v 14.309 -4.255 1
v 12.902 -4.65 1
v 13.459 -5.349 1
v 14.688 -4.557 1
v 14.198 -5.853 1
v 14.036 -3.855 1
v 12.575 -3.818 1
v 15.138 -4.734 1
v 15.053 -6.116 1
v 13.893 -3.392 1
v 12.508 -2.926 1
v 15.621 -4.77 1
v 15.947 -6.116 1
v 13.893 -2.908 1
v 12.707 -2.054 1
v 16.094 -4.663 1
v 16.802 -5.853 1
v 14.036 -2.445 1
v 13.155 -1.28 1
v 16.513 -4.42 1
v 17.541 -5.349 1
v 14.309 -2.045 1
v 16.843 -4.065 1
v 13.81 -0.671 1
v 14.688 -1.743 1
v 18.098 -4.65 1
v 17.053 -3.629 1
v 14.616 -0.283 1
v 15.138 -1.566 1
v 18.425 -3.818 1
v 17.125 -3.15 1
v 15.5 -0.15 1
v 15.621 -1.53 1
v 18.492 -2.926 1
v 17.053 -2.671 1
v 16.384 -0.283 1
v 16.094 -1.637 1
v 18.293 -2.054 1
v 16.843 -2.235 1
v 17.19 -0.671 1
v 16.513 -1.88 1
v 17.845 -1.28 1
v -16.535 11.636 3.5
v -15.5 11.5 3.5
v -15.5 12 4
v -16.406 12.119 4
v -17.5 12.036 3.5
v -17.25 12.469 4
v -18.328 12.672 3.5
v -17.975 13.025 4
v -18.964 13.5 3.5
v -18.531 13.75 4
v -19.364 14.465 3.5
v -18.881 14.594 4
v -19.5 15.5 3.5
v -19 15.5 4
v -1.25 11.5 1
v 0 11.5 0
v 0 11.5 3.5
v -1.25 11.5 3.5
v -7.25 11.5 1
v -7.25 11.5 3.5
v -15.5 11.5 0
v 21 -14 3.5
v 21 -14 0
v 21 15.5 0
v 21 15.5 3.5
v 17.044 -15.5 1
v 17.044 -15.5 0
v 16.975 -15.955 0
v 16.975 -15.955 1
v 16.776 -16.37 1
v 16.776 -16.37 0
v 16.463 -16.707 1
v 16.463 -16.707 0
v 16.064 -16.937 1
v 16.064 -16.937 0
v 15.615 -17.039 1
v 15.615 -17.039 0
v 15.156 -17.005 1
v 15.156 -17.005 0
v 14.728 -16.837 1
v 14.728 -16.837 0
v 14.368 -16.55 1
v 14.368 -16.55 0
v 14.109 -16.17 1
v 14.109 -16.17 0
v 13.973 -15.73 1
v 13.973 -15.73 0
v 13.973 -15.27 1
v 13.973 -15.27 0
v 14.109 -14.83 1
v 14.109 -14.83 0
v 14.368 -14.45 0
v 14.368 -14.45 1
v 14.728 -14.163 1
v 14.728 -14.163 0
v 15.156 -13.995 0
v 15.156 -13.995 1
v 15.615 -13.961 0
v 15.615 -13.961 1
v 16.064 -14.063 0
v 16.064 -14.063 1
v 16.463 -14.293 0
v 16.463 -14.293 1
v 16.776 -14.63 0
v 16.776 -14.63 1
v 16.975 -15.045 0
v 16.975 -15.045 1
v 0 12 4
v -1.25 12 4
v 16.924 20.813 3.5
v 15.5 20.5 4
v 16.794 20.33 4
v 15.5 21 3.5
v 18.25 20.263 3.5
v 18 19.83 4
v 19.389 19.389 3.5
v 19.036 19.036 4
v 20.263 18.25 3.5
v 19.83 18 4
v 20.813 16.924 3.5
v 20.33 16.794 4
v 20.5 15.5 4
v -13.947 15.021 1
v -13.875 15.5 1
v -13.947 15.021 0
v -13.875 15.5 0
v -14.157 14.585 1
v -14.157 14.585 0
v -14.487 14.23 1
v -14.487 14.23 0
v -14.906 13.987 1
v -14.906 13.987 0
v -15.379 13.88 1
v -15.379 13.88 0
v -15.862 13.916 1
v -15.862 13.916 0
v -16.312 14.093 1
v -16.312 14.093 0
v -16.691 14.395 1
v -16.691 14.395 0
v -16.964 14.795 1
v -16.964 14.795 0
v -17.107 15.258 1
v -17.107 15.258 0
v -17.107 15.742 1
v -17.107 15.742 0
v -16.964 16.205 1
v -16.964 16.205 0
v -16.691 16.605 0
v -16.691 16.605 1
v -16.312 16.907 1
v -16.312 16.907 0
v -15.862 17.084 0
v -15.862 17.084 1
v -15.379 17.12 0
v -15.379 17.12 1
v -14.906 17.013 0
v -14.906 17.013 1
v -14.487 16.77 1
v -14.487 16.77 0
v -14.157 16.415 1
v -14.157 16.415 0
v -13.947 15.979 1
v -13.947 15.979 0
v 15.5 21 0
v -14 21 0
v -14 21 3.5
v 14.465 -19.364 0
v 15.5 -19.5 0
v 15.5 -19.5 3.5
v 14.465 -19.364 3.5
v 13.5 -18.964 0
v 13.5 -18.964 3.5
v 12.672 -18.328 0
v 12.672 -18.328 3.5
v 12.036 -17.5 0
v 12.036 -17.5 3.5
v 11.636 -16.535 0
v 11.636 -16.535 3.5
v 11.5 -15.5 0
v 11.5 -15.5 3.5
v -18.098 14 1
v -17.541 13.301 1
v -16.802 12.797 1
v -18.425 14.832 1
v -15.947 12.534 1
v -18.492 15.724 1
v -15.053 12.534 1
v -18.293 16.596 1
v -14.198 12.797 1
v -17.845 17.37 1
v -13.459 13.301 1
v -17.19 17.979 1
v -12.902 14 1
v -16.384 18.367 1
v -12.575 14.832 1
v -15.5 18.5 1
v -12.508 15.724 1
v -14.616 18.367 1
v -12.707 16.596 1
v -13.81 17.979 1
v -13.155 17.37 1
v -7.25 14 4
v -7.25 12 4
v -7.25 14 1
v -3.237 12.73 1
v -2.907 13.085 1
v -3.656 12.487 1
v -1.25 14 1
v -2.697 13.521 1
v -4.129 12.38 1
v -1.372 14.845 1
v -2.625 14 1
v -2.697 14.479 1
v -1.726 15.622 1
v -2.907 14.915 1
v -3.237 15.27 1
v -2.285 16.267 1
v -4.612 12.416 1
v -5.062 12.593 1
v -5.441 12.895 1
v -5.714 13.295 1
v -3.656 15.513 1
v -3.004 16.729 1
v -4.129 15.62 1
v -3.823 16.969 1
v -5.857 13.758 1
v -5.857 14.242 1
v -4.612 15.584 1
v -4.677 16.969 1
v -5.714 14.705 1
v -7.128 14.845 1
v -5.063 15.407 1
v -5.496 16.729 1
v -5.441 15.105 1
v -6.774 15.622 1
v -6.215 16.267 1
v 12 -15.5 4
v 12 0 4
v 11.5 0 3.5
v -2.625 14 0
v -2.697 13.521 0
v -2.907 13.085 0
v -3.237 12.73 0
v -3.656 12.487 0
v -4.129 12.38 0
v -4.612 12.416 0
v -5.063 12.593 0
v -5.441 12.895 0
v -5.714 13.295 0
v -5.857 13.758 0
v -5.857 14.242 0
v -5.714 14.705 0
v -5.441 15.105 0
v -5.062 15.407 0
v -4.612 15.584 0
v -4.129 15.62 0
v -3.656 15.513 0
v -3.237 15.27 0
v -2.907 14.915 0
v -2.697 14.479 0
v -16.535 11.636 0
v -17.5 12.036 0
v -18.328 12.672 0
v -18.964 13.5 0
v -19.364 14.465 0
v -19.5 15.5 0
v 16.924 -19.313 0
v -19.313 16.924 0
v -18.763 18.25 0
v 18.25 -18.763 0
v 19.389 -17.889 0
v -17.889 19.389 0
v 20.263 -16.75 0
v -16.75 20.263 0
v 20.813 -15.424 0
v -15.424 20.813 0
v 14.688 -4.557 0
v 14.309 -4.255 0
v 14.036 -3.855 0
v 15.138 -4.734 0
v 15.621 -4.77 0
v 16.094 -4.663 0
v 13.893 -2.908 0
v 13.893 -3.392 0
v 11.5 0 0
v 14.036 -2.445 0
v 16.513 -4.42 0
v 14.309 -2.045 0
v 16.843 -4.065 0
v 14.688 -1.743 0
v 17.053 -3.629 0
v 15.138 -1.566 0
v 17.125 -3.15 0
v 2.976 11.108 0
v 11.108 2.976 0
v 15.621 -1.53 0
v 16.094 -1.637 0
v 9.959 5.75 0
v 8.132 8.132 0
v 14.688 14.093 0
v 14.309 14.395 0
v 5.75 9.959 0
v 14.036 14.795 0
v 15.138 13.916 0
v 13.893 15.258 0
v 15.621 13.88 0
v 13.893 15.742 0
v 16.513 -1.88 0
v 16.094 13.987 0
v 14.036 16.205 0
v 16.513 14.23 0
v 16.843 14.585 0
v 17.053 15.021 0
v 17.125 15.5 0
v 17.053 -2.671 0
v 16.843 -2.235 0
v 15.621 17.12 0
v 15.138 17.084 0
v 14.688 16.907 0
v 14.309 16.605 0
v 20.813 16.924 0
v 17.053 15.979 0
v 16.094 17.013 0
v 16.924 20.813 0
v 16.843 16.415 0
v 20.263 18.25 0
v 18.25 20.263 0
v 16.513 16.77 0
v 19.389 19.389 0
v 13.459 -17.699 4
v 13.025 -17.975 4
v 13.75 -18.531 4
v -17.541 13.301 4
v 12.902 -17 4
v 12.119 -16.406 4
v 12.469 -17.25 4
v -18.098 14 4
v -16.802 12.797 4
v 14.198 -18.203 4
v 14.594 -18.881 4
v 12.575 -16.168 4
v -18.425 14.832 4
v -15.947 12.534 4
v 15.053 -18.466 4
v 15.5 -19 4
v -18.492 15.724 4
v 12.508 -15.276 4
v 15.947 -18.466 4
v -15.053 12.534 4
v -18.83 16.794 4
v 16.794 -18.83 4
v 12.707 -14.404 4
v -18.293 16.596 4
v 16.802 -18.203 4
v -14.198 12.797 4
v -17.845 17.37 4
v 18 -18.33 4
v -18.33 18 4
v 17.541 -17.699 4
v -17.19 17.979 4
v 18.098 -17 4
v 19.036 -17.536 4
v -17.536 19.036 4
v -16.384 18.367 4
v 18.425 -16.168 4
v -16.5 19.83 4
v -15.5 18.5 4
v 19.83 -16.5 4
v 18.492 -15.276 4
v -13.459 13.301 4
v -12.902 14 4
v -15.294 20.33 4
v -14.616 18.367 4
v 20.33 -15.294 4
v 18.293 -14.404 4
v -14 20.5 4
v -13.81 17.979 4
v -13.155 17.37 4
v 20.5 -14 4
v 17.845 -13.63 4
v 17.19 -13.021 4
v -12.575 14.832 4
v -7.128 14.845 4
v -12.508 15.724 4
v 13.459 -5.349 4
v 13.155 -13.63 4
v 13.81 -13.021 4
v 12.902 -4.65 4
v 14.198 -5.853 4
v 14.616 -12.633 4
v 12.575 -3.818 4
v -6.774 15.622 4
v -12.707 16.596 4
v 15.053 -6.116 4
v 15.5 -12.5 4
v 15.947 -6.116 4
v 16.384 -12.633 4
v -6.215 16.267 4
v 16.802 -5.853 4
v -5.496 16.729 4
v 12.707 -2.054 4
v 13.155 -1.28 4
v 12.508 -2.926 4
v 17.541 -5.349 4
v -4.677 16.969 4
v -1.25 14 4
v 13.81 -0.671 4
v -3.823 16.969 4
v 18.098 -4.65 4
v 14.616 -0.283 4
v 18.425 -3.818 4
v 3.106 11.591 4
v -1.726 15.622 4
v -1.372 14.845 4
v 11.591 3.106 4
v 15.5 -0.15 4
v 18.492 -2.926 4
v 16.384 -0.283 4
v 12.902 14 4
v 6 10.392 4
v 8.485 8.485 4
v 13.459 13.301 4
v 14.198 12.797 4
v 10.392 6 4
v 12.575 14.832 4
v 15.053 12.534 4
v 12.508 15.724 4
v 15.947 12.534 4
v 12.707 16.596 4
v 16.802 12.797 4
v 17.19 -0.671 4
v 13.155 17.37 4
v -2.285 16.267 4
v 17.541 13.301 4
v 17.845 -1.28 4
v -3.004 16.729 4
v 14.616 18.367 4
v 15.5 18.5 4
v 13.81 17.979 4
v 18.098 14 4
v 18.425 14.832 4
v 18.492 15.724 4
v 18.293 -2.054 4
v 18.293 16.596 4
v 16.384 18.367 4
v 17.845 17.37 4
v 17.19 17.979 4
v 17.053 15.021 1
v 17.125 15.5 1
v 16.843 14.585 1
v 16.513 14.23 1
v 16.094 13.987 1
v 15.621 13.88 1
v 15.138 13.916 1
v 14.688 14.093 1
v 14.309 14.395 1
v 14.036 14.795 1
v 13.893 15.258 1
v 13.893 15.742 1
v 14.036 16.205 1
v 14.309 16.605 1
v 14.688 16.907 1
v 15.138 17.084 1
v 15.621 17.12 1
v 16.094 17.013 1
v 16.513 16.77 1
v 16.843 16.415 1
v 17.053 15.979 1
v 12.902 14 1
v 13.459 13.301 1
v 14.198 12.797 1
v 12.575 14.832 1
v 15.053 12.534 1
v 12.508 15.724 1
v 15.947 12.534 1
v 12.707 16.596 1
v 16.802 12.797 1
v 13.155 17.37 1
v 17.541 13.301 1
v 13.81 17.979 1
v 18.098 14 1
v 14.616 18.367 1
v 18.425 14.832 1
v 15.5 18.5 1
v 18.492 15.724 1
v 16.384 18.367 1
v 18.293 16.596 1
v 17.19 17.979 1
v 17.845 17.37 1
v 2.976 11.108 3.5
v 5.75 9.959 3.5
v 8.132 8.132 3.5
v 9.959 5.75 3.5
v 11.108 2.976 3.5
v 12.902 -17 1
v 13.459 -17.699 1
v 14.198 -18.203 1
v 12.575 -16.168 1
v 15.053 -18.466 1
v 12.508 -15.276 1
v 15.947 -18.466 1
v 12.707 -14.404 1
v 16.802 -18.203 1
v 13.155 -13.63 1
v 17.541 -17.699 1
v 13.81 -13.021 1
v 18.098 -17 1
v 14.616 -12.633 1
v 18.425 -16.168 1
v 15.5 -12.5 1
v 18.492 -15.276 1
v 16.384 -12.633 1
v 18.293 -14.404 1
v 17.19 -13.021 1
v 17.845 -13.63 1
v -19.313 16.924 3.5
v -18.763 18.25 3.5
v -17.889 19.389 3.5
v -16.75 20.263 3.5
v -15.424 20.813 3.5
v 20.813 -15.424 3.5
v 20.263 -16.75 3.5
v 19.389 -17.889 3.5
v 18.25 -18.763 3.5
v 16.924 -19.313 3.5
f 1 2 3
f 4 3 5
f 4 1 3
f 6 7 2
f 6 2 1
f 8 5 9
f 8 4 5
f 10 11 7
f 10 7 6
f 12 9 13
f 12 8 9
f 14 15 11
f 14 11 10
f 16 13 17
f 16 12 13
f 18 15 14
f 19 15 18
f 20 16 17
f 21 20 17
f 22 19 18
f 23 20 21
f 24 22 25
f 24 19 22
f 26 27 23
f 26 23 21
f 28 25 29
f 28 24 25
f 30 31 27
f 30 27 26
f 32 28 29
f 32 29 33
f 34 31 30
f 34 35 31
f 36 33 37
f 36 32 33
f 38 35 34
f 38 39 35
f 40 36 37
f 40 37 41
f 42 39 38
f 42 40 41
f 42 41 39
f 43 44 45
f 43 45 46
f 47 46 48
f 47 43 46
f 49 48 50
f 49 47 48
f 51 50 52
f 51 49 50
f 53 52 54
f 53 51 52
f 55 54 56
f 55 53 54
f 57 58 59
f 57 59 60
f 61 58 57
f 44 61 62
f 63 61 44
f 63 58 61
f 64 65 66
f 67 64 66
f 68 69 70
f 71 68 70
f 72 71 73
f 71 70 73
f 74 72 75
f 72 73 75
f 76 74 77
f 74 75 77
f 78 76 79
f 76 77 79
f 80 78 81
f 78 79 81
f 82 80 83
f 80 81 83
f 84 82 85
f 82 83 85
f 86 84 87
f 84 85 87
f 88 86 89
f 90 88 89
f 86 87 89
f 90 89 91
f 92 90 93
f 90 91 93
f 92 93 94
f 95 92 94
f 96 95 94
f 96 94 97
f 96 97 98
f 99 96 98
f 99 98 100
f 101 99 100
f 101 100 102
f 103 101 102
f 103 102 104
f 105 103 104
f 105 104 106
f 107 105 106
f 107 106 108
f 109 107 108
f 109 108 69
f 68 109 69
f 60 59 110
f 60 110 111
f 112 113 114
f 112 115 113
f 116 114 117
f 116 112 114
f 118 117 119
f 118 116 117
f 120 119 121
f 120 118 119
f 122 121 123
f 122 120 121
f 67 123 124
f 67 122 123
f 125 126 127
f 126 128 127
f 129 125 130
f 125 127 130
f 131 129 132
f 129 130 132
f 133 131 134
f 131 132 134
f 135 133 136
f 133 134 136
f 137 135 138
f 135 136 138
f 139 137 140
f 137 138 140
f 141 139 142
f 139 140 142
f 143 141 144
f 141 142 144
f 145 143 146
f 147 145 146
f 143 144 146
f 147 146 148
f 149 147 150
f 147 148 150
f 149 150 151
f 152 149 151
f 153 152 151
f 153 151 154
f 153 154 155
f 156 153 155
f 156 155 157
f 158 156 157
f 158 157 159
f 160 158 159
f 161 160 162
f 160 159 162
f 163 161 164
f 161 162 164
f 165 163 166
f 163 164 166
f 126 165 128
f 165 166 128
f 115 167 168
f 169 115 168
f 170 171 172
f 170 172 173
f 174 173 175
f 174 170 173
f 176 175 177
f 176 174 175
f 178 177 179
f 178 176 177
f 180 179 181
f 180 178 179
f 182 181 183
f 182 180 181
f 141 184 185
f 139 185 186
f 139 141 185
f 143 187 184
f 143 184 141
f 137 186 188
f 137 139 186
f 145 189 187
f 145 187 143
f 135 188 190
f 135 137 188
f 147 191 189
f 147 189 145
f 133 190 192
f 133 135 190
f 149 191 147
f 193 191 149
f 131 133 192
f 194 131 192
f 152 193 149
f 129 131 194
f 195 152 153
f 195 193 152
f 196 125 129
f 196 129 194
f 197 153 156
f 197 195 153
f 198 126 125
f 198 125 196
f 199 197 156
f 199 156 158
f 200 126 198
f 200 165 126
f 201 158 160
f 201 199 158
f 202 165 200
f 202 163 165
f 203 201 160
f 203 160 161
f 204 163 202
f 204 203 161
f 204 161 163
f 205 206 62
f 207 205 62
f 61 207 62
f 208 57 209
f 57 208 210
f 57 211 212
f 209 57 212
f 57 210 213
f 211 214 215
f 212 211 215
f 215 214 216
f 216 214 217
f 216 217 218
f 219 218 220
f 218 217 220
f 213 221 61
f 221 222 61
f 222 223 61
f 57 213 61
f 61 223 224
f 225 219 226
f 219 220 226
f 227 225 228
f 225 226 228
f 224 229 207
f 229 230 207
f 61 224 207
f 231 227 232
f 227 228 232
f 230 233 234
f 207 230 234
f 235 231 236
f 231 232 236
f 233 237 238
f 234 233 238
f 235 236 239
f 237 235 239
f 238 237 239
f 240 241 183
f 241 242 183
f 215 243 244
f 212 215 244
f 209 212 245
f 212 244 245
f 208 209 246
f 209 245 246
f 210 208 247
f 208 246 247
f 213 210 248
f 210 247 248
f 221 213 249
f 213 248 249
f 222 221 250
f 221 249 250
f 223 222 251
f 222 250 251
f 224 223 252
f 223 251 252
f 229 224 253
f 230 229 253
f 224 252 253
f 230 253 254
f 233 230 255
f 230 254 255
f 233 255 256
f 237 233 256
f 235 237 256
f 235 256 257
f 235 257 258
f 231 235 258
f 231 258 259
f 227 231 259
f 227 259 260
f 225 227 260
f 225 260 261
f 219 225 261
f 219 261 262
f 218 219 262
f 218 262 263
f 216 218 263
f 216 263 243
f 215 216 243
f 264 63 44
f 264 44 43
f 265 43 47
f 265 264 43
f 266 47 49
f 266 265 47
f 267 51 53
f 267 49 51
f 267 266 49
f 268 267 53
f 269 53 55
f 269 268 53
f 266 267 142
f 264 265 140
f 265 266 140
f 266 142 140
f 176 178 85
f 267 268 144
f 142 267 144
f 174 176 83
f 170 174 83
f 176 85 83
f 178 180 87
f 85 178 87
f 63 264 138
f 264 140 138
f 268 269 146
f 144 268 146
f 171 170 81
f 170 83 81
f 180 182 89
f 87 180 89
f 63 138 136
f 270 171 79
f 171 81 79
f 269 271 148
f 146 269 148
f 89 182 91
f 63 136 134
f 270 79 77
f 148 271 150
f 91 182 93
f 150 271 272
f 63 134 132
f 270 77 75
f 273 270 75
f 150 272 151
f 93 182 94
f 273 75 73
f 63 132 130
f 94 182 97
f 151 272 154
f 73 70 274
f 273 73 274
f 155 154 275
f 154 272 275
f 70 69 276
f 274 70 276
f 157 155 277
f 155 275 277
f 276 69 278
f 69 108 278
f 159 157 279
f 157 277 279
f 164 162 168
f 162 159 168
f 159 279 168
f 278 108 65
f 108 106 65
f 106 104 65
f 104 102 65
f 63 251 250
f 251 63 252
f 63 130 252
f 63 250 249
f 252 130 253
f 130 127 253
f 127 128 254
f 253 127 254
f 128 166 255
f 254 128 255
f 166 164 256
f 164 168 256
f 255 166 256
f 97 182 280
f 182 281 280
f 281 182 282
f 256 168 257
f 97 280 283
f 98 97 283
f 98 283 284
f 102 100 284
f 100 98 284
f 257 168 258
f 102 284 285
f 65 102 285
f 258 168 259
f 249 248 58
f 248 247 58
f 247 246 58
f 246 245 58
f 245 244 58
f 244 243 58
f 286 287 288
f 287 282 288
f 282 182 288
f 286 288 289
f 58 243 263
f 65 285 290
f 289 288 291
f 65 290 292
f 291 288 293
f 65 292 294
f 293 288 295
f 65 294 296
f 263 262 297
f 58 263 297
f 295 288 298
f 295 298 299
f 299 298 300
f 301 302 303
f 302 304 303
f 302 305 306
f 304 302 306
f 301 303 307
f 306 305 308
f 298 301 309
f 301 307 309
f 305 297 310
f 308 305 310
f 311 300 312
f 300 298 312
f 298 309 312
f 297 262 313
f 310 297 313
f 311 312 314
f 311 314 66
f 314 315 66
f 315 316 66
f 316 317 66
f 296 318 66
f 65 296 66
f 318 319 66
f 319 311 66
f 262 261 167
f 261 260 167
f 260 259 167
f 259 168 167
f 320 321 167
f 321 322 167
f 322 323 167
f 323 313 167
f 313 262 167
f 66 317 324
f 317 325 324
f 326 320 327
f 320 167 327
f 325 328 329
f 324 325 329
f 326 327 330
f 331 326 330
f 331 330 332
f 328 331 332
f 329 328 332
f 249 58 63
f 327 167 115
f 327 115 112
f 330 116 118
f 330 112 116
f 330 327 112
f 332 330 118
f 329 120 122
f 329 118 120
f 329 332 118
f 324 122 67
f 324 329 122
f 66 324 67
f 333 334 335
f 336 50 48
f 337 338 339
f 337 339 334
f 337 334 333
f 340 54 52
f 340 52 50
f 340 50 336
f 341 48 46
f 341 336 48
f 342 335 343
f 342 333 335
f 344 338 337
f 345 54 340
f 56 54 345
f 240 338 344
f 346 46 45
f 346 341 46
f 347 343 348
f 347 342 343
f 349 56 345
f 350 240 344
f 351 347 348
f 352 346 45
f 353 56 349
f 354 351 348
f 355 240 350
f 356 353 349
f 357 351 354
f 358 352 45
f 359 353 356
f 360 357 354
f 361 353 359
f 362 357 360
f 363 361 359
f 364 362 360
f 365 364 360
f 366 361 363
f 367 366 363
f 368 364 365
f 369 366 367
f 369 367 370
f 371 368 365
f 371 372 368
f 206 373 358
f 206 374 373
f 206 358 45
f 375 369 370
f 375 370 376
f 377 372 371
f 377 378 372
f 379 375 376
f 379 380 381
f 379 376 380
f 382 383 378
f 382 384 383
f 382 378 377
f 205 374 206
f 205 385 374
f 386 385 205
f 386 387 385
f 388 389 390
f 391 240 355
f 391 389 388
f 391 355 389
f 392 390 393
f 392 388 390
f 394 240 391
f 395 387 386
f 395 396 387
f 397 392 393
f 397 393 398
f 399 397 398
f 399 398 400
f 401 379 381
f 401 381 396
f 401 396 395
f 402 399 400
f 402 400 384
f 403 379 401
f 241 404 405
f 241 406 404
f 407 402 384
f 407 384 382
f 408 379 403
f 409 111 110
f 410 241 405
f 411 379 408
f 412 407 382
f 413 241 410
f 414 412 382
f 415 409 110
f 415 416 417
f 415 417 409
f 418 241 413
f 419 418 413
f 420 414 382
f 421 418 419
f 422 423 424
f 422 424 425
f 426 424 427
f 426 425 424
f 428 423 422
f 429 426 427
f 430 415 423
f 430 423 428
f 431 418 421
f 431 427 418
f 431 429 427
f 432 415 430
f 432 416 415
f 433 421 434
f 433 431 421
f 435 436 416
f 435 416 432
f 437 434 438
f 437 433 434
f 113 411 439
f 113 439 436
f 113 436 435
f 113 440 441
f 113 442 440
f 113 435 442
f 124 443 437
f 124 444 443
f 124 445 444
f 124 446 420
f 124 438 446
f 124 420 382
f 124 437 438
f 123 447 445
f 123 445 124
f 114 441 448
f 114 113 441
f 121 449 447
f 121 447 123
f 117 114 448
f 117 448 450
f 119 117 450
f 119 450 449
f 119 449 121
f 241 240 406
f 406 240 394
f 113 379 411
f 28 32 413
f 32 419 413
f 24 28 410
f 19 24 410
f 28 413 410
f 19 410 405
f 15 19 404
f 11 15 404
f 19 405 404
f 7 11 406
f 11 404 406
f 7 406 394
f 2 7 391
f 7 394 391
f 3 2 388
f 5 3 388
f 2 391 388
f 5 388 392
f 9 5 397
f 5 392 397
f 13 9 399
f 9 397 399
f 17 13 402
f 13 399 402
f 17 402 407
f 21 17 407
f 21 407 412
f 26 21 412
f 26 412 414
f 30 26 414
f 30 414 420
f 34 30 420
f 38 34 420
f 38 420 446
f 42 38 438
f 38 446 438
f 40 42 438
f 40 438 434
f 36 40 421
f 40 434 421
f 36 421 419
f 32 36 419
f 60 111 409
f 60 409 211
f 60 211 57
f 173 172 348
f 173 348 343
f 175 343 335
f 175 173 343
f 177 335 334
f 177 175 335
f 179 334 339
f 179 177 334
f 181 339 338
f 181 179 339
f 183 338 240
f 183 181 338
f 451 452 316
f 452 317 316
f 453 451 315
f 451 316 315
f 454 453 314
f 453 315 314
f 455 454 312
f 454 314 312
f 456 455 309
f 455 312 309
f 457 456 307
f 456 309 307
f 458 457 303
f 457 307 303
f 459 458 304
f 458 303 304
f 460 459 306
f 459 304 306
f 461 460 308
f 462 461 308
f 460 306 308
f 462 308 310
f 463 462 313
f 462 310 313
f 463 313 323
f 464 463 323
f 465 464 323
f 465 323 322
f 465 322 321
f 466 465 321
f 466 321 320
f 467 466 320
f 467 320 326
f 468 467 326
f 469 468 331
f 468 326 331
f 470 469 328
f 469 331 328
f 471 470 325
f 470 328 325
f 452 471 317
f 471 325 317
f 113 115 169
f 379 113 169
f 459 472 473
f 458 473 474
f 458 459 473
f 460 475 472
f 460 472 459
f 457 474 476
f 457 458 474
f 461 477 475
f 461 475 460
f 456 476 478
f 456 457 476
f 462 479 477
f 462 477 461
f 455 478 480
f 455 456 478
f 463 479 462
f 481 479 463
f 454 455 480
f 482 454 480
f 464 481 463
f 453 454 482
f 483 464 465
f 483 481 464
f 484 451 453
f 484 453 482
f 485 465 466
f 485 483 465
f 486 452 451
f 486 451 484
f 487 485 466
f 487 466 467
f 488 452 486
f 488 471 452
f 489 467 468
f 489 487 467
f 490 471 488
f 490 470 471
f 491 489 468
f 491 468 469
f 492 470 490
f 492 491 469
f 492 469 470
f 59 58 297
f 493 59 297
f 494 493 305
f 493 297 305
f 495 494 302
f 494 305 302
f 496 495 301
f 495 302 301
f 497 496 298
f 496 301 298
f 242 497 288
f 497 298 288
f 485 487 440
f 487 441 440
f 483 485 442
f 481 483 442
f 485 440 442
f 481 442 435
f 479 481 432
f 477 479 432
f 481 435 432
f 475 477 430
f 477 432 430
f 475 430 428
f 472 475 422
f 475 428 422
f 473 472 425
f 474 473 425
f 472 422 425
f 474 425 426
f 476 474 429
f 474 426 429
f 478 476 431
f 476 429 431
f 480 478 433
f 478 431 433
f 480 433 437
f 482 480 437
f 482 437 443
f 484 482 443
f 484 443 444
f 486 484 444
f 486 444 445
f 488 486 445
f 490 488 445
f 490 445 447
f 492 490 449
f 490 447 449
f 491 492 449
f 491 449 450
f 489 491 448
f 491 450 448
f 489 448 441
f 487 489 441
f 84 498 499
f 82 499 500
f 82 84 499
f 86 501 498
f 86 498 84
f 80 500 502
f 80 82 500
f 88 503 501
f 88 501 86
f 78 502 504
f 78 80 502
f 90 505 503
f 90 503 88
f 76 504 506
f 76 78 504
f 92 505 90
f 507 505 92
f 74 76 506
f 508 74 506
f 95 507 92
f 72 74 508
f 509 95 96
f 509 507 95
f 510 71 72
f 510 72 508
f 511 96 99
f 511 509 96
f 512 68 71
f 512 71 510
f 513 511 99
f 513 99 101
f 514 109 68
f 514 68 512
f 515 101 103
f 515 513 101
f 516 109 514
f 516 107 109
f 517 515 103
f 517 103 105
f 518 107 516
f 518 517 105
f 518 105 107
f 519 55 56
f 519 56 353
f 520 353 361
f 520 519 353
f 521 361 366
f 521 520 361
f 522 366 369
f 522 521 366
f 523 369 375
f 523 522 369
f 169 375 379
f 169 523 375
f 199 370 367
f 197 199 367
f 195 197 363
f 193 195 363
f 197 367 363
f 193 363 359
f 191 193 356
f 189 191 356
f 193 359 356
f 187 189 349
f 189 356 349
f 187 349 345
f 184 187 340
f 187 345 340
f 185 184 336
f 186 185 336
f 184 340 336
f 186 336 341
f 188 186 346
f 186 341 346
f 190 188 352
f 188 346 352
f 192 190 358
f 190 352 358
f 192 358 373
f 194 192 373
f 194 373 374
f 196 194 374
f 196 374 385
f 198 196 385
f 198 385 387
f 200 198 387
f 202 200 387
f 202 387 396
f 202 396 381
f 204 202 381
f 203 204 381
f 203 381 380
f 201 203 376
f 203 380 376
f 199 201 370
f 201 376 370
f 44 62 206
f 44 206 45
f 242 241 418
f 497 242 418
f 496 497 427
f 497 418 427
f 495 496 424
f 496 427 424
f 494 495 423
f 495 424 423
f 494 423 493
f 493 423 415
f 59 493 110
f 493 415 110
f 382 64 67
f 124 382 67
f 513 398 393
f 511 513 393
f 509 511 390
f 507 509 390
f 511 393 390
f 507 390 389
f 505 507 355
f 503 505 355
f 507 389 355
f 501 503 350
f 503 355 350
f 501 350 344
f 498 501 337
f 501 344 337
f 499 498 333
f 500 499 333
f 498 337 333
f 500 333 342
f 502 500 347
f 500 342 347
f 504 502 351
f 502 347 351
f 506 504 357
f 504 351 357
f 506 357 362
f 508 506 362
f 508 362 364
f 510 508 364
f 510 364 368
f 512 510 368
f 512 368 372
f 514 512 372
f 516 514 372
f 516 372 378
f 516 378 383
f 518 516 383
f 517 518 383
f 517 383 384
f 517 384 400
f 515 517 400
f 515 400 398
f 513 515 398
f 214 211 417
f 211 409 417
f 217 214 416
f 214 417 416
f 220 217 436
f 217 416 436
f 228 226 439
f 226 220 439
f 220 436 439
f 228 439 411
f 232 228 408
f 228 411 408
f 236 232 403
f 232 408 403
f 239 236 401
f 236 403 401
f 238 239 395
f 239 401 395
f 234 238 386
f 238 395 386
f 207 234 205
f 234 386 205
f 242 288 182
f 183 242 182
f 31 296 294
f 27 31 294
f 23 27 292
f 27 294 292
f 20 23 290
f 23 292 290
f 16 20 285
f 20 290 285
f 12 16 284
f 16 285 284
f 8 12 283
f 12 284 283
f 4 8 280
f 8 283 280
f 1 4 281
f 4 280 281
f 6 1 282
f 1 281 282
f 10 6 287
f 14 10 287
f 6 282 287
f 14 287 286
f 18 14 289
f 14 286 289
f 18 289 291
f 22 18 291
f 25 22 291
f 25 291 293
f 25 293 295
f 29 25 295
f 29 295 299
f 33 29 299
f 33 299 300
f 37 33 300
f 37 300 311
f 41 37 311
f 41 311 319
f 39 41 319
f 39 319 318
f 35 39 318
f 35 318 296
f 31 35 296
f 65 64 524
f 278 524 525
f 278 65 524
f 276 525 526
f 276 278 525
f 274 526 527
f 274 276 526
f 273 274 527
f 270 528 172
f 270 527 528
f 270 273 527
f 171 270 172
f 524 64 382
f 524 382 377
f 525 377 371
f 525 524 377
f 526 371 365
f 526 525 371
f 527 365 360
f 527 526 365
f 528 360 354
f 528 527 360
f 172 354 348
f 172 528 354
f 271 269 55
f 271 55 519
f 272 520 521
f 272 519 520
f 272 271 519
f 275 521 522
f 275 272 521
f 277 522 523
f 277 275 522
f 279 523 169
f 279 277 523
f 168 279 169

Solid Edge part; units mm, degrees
sketch "Sketch1" plane through (0, 0, 0) normal (0, 0, 1) x (1, 0, 0)
  line L0 (21, -14) -> (21, 15.5)
  arc A0 (21, 15.5) -> (15.5, 21) centre (15.5, 15.5) ccw
  line L1 (15.5, 21) -> (-14, 21)
  arc A1 (-19.5, 15.5) -> (-14, 21) centre (-14, 15.5) cw
  arc A2 (-15.5, 11.5) -> (-19.5, 15.5) centre (-15.5, 15.5) cw
  line L2 (0, 11.5) -> (-15.5, 11.5)
  line L3 (11.5, 0) -> (11.5, -15.5)
  arc A3 (11.5, -15.5) -> (15.5, -19.5) centre (15.5, -15.5) ccw
  arc A4 (15.5, -19.5) -> (21, -14) centre (15.5, -14) ccw
  arc A5 (0, 11.5) -> (11.5, 0) centre (0, 0) cw
extrude "Protrusion1" add sketch "Sketch1" along normal blind 4
sketch "Sketch2" plane through (0, 0, 0) normal (0, 0, 1) x (1, 0, 0)
  circle A0 centre (-15.5, 15.5) radius 1.625
  circle A1 centre (-4.25, 14) radius 1.625
  circle A2 centre (15.5, 15.5) radius 1.625
  circle A3 centre (15.5, -3.15) radius 1.625
  circle A4 centre (15.5, -15.5) radius 1.5438
  dimension "D1" = 31
  dimension "D2" = 31
  dimension "D3" = 23
  dimension "D4" = 3.25
  dimension "D5" = 3.25
  dimension "D6" = 3.0875
  dimension "D7" = 29.5
  dimension "D8" = 5.5
  dimension "D9" = 5.5
  dimension "D10" = 4.25
  dimension "D11" = 14
  dimension "D12" = 3.15
  dimension "D13" = 3.25
  dimension "D14" = 3.25
extrude "Cutout1" cut sketch "Sketch2" along normal through all
sketch "Sketch3" plane through (0.75, 0.75, 4) normal (0, 0, 1) x (0, 1, 0)
  circle A0 centre (14.75, 16.25) radius 3
  line L0 (13.25, 2) -> (10.75, 2)
  line L1 (10.75, 8) -> (10.75, 2)
  line L2 (13.25, 8) -> (10.75, 8)
  arc A1 (13.25, 8) -> (13.25, 2) centre (13.25, 5) cw
  circle A2 centre (14.75, -14.75) radius 3
  circle A3 centre (-3.9, -14.75) radius 3
  circle A4 centre (-16.25, -14.75) radius 3
extrude "VaciadoExtruido_2" cut sketch "Sketch3" against normal blind 3
chamfer "Chaflán_1" distance 0.5 angle 45 11 edges at (8.1317, 8.1317, 4) (11.5, -7.75, 4) (12.6716, -18.3284, 4) (19.3891, -17.8891, 4) (21, 0.75, 4) (19.3891, 19.3891, 4) (0.75, 21, 4) (-17.8891, 19.3891, 4) (-18.3284, 12.6716, 4) (-11.375, 11.5, 4) (-0.625, 11.5, 4)
